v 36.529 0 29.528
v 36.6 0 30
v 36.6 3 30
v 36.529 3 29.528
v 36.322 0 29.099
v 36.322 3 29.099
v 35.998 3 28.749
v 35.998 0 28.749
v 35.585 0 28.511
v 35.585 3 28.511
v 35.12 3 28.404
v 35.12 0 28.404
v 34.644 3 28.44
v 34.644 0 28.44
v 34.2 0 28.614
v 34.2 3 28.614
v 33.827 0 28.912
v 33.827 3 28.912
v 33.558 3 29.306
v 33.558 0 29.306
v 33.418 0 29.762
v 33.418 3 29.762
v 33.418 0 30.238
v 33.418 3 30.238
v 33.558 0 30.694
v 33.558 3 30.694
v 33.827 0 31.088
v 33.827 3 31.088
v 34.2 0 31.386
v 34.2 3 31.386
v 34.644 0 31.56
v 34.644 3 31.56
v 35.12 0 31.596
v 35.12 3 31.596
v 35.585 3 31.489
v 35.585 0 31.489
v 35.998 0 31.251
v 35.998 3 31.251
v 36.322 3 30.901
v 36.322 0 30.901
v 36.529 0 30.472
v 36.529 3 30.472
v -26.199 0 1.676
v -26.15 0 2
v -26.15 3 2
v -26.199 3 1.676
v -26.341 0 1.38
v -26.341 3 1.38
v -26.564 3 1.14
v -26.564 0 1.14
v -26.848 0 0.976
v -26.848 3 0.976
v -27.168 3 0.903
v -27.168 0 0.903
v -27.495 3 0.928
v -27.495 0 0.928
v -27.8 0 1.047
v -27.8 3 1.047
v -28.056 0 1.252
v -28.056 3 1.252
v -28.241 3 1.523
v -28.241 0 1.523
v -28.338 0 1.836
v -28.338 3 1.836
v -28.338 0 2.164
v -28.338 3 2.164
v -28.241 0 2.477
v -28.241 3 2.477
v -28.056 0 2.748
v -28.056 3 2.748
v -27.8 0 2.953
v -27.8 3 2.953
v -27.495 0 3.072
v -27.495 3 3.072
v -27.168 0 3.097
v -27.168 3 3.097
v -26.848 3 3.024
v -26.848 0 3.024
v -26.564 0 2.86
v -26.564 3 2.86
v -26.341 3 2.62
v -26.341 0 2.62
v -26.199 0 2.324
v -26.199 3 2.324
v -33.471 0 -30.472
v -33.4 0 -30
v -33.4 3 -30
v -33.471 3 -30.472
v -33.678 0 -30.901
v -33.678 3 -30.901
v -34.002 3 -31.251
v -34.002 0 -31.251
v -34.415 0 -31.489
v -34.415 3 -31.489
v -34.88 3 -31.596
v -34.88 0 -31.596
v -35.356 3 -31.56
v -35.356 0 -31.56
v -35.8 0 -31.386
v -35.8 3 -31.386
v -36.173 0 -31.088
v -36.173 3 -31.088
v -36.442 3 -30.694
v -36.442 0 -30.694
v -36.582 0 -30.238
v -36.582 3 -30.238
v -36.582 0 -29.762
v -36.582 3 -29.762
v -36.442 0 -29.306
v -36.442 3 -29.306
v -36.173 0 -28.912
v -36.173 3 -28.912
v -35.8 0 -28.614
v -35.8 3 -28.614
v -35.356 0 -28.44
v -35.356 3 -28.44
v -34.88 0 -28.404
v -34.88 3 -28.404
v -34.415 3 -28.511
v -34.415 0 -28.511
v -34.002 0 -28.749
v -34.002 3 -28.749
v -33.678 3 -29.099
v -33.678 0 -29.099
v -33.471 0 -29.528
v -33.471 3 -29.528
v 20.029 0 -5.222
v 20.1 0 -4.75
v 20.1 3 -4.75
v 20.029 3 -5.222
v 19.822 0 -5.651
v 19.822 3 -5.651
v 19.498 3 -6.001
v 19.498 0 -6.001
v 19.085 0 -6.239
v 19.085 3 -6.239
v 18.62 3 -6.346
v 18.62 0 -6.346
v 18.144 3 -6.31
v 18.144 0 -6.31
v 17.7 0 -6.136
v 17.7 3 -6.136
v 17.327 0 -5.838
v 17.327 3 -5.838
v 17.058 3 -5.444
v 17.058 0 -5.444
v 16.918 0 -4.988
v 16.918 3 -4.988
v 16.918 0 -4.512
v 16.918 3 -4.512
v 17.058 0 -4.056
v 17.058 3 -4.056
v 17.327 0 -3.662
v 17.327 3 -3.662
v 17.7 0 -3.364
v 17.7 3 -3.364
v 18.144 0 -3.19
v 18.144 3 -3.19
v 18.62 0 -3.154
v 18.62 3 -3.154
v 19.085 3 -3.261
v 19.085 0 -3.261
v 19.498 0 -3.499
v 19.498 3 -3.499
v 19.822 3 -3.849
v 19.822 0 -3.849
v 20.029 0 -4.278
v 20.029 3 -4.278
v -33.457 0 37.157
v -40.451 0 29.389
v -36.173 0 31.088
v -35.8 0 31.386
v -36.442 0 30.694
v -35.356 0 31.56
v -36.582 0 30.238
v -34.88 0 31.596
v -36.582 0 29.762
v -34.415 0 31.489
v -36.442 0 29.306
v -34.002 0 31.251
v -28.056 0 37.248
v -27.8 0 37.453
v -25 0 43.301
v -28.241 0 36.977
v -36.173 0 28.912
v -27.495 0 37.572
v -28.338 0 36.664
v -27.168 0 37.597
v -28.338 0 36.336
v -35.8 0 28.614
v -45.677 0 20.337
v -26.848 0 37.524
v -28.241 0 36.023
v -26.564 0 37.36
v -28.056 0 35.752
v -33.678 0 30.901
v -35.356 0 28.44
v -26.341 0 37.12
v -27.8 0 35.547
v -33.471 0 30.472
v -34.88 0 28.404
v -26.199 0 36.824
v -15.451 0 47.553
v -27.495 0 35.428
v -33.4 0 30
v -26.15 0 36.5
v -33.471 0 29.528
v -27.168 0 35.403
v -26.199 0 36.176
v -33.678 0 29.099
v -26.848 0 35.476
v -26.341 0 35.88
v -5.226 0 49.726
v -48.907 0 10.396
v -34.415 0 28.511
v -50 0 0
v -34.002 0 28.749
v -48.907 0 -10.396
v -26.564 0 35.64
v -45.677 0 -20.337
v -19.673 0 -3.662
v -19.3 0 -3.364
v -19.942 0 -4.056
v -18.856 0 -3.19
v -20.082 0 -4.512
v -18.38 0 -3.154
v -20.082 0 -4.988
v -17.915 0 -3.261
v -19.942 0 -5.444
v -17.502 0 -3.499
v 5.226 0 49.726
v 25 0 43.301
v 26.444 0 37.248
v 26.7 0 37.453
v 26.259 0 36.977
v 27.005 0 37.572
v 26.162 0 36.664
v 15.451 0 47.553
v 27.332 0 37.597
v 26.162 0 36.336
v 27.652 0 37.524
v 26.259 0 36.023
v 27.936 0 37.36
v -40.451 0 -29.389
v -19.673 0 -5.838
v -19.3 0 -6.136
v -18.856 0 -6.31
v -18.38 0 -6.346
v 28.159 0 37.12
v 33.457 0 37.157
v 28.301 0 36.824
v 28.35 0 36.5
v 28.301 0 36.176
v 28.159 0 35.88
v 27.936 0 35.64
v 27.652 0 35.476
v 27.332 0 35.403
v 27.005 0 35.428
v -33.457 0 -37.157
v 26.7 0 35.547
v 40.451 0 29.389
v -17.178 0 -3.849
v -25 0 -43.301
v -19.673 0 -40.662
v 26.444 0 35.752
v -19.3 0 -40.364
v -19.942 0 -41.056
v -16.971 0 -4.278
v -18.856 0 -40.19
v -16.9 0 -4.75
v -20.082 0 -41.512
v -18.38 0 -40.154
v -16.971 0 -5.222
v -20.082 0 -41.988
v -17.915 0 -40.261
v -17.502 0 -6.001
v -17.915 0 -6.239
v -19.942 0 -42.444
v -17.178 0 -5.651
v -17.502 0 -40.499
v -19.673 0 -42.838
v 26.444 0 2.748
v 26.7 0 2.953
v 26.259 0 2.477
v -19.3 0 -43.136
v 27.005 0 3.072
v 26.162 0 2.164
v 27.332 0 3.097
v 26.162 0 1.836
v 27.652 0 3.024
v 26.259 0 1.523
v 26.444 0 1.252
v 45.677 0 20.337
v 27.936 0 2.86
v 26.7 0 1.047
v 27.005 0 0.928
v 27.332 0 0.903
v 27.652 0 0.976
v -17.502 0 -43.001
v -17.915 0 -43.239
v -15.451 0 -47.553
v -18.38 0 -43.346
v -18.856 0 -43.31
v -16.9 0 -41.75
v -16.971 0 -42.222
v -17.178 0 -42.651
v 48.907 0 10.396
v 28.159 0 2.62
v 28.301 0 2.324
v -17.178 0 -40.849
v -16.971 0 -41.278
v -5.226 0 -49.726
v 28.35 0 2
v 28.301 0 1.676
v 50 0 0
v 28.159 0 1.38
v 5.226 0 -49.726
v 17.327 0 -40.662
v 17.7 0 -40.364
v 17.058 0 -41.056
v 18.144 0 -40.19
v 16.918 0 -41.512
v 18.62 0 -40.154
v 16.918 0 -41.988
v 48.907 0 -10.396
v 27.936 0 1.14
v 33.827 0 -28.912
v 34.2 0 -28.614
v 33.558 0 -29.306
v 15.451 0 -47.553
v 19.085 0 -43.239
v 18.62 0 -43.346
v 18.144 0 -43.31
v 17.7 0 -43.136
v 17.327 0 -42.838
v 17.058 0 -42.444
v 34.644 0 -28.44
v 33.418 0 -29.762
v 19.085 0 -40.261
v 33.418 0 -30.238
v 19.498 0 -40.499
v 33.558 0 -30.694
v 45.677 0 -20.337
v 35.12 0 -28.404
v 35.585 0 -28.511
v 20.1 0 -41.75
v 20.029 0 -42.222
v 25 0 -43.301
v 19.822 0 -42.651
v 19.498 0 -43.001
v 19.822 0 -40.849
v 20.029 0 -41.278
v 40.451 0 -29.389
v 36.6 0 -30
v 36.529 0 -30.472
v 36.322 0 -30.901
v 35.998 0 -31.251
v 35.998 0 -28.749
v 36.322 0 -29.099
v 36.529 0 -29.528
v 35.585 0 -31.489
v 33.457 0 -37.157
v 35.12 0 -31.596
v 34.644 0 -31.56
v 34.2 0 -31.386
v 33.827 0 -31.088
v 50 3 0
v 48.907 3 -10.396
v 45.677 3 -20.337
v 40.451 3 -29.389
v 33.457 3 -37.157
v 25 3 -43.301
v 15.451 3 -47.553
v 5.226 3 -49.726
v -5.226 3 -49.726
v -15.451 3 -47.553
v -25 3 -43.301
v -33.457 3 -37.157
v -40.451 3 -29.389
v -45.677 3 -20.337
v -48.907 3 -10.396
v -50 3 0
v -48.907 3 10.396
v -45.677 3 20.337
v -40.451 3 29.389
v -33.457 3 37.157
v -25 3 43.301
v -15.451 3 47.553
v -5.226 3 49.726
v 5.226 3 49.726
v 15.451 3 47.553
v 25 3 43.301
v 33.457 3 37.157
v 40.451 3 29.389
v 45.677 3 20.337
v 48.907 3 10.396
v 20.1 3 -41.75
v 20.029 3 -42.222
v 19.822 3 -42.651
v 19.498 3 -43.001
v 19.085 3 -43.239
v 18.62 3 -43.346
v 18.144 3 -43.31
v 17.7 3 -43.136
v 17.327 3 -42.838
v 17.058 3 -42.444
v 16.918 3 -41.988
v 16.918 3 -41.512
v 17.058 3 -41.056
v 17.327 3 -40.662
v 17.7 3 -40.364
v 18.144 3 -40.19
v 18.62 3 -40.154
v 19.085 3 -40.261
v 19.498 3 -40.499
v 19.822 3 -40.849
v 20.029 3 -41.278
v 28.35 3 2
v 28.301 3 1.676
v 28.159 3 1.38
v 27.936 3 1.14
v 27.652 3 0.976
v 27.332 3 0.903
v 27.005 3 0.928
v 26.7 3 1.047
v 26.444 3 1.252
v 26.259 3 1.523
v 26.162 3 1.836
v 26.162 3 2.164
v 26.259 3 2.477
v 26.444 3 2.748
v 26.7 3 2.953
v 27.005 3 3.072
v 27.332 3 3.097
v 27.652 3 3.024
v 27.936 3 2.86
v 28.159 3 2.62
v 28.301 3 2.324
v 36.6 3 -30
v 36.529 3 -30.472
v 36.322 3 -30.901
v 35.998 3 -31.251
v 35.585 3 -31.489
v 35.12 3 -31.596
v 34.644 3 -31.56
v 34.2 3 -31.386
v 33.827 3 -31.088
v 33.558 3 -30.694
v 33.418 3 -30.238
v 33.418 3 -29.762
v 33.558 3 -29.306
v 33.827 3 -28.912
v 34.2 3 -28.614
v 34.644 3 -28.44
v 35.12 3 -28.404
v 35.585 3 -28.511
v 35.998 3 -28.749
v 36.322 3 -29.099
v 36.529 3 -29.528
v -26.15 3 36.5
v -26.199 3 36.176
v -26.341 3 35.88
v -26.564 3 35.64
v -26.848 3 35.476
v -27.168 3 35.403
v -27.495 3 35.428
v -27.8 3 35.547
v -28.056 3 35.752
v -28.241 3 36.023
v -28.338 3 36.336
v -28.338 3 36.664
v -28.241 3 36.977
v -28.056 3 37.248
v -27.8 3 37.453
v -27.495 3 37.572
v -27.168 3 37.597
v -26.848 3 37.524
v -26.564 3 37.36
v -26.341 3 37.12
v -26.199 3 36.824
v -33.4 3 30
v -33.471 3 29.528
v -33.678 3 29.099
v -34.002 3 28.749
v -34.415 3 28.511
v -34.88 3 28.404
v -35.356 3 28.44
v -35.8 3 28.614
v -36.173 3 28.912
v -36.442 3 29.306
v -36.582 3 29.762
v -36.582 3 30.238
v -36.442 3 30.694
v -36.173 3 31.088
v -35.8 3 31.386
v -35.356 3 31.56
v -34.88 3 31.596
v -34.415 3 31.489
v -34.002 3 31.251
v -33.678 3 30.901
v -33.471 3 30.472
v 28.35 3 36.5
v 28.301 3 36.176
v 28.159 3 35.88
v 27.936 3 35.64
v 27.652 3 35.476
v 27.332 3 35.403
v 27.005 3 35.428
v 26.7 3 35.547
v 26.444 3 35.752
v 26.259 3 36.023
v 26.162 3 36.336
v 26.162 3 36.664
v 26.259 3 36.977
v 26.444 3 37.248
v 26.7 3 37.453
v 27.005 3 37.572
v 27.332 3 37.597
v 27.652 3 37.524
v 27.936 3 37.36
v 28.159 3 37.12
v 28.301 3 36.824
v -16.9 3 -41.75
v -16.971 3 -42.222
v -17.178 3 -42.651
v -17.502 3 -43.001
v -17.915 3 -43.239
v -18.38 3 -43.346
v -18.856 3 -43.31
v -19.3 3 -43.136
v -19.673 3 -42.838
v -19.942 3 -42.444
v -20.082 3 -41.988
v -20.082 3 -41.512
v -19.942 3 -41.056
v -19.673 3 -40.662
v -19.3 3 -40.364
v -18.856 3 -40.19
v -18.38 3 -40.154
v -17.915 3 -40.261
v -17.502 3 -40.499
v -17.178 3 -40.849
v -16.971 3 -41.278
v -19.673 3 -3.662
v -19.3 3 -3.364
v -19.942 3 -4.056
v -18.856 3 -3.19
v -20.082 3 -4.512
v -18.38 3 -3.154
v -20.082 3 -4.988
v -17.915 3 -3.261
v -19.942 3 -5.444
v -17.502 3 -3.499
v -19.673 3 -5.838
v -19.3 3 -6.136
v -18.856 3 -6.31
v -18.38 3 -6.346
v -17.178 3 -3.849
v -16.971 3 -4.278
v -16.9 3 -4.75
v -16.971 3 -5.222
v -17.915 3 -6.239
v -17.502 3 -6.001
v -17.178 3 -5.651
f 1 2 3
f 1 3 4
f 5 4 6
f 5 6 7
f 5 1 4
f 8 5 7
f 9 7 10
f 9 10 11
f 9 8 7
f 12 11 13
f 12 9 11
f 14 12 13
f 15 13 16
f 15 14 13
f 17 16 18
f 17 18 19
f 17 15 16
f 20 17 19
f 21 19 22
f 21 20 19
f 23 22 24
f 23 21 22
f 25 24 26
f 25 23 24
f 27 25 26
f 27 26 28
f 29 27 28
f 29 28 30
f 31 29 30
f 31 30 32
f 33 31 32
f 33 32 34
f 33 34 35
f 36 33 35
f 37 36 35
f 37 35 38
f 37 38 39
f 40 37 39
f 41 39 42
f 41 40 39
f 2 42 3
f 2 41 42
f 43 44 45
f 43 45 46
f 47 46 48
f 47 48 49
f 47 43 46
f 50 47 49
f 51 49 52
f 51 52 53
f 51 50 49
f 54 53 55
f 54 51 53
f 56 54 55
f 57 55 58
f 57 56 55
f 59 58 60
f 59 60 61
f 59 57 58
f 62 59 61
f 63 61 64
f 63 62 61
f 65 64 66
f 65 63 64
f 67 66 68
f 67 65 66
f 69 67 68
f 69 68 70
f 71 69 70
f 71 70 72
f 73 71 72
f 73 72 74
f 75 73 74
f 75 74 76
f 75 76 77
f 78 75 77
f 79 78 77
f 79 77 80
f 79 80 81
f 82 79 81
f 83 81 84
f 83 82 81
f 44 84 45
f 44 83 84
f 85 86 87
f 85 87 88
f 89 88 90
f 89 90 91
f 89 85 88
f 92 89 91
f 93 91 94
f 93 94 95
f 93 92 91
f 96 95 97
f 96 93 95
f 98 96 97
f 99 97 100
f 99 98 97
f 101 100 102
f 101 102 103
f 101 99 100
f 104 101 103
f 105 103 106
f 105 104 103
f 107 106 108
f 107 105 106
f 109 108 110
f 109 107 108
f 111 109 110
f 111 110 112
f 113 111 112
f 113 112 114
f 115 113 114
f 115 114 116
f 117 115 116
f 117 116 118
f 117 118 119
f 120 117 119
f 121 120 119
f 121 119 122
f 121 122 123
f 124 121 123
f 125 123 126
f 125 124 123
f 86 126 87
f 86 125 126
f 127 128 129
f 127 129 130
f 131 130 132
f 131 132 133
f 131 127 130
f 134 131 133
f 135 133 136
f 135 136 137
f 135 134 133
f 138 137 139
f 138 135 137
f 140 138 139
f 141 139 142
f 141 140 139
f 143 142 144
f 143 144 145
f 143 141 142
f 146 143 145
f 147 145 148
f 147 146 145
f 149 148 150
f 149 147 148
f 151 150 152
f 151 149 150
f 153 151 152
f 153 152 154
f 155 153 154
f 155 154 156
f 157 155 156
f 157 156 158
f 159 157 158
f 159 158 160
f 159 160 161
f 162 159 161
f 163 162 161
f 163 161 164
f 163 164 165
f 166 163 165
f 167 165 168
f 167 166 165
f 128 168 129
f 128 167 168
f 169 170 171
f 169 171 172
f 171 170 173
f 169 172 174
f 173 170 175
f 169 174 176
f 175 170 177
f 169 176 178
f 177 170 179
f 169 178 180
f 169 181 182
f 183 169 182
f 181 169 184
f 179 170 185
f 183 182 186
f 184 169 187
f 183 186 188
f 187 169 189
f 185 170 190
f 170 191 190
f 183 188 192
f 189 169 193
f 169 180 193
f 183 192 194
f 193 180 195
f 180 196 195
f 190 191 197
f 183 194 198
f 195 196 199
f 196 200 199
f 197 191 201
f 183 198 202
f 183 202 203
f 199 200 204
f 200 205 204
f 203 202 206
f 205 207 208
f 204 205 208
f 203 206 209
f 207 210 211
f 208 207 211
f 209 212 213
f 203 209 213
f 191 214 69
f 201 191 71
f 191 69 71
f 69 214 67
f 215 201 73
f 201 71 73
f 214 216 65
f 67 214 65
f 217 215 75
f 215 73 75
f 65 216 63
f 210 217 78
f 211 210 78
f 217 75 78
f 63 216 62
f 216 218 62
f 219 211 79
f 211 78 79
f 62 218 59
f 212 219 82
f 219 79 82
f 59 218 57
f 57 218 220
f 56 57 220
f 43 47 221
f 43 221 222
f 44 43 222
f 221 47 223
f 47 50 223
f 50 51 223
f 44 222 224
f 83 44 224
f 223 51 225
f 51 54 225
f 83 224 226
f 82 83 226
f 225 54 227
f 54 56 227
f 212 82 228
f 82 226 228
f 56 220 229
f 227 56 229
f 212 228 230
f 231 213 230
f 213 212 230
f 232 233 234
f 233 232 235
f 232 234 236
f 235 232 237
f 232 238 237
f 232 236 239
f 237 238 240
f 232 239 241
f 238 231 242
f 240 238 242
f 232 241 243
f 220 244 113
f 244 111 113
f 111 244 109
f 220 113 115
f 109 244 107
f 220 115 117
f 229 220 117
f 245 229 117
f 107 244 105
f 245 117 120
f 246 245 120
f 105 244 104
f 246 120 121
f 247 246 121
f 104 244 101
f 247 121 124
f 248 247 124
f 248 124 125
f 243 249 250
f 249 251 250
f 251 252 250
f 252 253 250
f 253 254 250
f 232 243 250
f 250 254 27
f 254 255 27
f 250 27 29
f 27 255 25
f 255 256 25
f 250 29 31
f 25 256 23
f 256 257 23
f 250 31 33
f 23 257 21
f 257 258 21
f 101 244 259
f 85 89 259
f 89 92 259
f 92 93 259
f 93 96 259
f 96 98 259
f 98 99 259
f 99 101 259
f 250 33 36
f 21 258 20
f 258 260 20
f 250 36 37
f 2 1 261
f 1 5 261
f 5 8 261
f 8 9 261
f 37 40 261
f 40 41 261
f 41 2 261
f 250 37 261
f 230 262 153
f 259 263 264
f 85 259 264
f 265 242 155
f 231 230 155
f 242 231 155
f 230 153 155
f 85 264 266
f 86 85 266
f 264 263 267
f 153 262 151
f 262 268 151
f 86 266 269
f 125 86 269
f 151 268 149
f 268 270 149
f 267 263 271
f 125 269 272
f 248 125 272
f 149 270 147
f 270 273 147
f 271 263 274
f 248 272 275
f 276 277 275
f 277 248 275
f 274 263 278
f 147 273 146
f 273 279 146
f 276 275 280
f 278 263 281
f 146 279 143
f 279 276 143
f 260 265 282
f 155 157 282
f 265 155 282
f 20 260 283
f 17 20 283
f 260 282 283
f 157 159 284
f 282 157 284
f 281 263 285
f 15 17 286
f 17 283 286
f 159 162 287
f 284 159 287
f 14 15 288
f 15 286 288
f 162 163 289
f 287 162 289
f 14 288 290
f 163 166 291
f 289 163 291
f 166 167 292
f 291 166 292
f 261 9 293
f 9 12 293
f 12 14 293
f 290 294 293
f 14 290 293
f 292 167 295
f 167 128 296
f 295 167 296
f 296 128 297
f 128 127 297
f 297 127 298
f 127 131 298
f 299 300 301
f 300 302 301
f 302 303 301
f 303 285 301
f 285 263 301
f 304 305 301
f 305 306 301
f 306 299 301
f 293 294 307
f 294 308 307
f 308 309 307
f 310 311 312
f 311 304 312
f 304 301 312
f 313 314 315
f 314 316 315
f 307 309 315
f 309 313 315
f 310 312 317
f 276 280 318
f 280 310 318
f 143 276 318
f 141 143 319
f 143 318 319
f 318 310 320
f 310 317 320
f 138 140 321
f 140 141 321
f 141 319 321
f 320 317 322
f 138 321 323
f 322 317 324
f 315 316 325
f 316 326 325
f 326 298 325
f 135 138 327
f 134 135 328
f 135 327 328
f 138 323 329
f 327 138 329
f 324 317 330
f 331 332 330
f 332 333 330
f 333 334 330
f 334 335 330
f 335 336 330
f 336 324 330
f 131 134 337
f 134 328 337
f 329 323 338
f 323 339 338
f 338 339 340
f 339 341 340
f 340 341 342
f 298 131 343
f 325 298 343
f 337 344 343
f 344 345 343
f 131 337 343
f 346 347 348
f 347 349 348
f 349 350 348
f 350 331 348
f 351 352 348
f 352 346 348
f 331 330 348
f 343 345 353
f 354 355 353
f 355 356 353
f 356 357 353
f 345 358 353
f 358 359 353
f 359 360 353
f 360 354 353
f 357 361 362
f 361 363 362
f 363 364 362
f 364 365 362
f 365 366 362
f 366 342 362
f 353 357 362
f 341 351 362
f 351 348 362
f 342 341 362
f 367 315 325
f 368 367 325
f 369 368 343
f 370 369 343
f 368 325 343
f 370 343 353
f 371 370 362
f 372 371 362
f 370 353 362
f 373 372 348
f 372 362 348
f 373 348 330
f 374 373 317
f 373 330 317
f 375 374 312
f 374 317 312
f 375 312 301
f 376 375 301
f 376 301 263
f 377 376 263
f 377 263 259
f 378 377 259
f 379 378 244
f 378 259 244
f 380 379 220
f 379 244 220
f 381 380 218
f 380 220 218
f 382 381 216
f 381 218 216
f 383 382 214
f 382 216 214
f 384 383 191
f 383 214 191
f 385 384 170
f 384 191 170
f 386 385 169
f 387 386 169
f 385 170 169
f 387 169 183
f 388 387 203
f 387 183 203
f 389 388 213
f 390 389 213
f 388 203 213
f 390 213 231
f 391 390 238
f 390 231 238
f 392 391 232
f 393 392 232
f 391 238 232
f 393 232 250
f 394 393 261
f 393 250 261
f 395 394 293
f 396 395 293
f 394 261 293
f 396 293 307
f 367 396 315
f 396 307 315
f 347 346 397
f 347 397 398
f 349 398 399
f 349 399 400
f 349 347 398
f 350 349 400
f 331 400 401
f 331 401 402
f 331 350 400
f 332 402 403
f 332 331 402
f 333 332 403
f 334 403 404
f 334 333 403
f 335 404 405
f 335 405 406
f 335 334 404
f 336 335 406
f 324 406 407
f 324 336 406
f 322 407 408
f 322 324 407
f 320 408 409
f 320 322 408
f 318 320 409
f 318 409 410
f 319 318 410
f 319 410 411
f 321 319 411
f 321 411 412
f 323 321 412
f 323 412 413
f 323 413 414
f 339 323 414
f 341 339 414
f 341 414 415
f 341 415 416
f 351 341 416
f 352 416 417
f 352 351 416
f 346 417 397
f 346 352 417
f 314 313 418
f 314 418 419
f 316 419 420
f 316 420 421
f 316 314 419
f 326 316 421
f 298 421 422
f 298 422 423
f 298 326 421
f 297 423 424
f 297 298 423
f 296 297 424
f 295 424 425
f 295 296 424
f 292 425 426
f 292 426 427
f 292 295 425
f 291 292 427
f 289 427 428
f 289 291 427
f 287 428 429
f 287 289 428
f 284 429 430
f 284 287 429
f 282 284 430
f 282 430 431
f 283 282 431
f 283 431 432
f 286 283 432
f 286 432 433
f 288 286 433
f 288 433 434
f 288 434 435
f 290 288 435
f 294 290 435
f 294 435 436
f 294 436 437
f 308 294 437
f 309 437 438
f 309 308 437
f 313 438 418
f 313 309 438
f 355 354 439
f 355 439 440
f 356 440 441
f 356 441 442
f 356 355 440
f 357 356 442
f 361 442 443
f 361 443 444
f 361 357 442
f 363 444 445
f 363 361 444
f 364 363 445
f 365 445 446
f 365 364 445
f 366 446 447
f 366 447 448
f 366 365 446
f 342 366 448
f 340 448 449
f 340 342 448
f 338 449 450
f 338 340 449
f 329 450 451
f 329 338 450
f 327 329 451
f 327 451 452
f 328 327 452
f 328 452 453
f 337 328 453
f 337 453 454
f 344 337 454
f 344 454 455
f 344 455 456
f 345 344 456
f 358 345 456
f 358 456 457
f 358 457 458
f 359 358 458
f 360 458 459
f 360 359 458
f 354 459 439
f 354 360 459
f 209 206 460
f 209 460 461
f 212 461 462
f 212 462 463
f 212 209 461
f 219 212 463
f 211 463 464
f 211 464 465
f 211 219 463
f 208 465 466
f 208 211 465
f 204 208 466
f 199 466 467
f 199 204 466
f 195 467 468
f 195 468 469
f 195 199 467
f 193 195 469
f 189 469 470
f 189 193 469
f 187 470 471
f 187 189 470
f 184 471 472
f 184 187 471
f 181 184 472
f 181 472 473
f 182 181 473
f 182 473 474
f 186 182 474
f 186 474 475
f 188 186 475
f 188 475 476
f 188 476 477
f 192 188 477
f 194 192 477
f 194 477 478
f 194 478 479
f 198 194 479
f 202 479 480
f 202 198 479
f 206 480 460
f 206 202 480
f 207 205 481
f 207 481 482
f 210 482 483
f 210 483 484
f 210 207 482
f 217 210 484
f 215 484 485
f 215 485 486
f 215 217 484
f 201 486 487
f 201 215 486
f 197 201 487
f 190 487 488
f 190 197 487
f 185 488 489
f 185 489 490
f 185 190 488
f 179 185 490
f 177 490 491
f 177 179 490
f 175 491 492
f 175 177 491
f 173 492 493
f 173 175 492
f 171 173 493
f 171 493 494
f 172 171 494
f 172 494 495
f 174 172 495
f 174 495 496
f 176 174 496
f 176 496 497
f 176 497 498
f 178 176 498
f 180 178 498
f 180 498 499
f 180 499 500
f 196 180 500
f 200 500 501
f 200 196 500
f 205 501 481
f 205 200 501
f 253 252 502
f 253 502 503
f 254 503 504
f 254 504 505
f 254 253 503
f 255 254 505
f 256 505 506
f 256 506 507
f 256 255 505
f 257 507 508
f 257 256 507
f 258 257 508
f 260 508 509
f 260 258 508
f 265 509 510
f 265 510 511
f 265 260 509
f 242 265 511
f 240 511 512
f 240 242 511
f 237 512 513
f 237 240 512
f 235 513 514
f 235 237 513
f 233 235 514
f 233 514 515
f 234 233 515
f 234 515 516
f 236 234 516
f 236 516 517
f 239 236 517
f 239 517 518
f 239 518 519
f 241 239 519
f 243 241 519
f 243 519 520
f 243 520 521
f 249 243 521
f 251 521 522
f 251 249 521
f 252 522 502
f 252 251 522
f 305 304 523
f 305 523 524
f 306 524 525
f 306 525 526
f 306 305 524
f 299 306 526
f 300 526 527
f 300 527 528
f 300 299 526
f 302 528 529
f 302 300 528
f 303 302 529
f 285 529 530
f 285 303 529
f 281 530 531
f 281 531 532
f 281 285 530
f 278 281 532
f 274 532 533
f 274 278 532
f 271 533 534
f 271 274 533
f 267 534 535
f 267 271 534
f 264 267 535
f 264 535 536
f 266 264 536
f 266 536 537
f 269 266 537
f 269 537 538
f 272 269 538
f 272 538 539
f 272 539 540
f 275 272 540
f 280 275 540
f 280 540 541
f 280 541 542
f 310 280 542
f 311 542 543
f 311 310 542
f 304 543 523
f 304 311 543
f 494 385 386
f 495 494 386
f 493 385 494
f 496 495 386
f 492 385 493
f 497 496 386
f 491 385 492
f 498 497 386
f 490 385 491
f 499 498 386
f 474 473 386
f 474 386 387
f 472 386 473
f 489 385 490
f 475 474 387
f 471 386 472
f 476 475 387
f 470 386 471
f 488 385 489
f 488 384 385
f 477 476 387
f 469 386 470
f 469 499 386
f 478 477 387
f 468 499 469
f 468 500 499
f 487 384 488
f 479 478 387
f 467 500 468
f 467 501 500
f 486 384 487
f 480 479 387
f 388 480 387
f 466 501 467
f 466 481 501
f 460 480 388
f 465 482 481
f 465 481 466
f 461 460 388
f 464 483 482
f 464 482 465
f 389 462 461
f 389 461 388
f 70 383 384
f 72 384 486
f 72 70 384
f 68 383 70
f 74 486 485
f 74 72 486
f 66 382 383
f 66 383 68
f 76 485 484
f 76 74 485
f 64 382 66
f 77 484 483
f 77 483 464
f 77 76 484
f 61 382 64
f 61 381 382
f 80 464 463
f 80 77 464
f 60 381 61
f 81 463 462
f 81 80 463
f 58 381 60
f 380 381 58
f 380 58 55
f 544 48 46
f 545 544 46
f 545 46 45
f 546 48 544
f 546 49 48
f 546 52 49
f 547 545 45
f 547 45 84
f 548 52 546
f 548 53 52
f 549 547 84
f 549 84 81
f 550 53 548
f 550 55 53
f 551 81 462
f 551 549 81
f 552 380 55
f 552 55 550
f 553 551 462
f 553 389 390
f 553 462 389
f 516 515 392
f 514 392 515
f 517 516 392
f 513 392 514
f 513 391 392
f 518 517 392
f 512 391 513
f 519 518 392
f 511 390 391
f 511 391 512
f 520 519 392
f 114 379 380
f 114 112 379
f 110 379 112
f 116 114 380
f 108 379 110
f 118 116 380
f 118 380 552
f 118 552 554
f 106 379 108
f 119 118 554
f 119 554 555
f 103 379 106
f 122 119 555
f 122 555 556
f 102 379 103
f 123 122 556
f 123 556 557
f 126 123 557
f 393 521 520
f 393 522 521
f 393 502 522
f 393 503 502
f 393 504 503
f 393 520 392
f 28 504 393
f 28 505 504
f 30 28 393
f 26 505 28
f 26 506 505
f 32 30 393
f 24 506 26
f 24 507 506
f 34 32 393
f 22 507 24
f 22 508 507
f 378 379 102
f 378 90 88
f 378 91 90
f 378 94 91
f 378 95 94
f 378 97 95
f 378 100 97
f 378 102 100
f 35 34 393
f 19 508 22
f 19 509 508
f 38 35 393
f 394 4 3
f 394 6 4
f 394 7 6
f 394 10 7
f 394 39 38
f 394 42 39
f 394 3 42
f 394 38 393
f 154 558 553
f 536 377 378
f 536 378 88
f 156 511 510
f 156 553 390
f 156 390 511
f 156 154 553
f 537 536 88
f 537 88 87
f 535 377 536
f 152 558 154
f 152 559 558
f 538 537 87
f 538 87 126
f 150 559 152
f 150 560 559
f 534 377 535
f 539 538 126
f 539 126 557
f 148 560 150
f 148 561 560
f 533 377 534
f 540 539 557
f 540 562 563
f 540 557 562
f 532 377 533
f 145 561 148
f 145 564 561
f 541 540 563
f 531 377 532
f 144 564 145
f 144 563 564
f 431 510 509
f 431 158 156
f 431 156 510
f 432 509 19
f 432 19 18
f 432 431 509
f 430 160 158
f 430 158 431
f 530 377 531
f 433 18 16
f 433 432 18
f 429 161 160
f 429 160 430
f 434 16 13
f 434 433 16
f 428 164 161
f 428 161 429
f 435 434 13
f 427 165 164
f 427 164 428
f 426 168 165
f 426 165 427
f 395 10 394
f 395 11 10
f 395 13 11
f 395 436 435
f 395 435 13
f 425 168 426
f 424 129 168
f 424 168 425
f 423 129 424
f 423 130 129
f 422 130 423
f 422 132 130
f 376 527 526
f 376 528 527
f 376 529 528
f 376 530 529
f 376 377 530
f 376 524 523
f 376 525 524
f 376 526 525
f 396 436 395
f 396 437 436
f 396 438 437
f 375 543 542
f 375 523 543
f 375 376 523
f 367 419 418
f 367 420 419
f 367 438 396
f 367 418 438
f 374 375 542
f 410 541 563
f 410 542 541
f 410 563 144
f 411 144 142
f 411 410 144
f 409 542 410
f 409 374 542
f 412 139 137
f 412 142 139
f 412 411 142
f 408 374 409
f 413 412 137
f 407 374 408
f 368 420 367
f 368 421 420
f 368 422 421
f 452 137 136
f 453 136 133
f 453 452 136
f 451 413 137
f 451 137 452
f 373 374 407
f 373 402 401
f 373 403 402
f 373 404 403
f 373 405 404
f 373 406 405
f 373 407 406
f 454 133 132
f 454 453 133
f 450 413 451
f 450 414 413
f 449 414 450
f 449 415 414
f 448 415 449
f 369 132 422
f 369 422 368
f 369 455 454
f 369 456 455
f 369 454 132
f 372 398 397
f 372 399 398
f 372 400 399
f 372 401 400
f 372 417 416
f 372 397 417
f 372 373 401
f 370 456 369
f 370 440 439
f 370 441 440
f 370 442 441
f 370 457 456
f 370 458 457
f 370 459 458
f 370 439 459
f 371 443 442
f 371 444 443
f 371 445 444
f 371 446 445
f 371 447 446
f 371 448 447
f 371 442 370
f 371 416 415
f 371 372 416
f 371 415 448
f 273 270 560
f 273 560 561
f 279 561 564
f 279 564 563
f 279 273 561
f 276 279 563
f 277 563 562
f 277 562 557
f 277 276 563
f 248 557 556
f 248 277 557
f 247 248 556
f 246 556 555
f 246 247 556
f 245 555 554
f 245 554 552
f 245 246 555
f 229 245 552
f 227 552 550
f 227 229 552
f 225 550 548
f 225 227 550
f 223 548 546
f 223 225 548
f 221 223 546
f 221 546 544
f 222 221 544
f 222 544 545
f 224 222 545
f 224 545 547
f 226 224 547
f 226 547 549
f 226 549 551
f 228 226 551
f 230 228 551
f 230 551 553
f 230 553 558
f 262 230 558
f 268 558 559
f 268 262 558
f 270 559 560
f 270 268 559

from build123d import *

# Parameters (mm, degrees)
SKETCH1_R           = 50
SKETCH1_R_2         = 1.1
SKETCH1_R_3         = 1.6
BOSS_EXTRUDE1_DEPTH = 3


with BuildPart() as part:
    # Sketch1 → Boss-Extrude1 (new body)
    with BuildSketch(Plane(origin=(0, 0, 0), x_dir=(1, 0, 0), z_dir=(0, 1, 0))):
        Circle(SKETCH1_R)
        with Locations((-27.25, -2)):
            Circle(SKETCH1_R_2, mode=Mode.SUBTRACT)
        with Locations((-27.25, -36.5)):
            Circle(SKETCH1_R_2, mode=Mode.SUBTRACT)
        with Locations((27.25, -2)):
            Circle(SKETCH1_R_2, mode=Mode.SUBTRACT)
        with Locations((27.25, -36.5)):
            Circle(SKETCH1_R_2, mode=Mode.SUBTRACT)
        with Locations((-18.5, 41.75)):
            Circle(SKETCH1_R_3, mode=Mode.SUBTRACT)
        with Locations((18.5, 41.75)):
            Circle(SKETCH1_R_3, mode=Mode.SUBTRACT)
        with Locations((18.5, 4.75)):
            Circle(SKETCH1_R_3, mode=Mode.SUBTRACT)
        with Locations((-18.5, 4.75)):
            Circle(SKETCH1_R_3, mode=Mode.SUBTRACT)
        with Locations((-35, -30)):
            Circle(SKETCH1_R_3, mode=Mode.SUBTRACT)
        with Locations((-35, 30)):
            Circle(SKETCH1_R_3, mode=Mode.SUBTRACT)
        with Locations((35, -30)):
            Circle(SKETCH1_R_3, mode=Mode.SUBTRACT)
        with Locations((35, 30)):
            Circle(SKETCH1_R_3, mode=Mode.SUBTRACT)
    extrude(amount=BOSS_EXTRUDE1_DEPTH)


solid = part.part
